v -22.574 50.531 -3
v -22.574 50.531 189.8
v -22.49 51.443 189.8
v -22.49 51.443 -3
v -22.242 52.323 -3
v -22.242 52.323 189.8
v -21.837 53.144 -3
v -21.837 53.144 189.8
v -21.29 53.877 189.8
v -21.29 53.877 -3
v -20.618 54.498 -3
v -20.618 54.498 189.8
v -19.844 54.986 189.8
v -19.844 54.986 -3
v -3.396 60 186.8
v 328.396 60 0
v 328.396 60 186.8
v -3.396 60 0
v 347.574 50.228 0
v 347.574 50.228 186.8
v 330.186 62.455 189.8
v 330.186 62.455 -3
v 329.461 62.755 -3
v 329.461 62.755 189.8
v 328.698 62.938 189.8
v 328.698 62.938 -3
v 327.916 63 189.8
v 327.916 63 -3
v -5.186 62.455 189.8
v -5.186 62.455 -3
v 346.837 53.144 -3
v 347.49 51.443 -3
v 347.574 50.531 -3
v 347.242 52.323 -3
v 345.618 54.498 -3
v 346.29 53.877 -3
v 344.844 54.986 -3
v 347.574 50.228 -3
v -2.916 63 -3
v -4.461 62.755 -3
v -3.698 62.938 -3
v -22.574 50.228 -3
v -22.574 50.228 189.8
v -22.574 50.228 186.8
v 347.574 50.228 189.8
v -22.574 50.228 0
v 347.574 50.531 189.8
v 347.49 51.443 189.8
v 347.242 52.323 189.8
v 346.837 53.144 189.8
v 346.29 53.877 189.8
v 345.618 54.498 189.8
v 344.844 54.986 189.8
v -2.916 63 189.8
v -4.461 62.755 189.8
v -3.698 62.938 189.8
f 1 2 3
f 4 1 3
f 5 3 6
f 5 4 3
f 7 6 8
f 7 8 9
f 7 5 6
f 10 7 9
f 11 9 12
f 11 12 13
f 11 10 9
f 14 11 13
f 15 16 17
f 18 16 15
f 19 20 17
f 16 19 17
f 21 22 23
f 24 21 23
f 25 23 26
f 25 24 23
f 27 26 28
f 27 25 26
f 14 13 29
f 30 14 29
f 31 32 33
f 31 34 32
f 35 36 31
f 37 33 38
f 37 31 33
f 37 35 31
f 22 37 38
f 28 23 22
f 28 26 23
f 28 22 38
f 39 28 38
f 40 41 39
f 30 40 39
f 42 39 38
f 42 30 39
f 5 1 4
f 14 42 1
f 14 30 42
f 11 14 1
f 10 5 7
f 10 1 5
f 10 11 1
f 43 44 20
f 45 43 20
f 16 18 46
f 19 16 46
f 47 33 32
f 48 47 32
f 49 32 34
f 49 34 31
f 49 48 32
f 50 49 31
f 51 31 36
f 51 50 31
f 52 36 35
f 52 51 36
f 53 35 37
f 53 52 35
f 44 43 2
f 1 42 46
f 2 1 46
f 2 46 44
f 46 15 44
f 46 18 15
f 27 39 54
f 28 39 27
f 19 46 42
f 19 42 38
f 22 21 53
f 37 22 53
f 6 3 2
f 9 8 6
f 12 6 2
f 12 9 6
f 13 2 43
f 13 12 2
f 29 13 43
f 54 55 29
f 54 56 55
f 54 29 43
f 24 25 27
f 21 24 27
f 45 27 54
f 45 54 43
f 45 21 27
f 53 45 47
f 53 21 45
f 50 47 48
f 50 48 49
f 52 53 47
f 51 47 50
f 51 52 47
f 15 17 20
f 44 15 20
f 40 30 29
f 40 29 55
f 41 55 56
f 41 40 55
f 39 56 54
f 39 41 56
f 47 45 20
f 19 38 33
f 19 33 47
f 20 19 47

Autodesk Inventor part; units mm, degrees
ref_plane "YZ Plane" through (0, 0, 0) normal (1, 0, 0) x (0, 1, 0)
ref_plane "XZ Plane" through (0, 0, 0) normal (0, 1, 0) x (-1, 0, 0)
ref_plane "XY Plane" through (0, 0, 0) normal (0, 0, 1) x (1, 0, 0)
sketch "Sketch1" plane through (0, 0, 0) normal (0, 0, 1) x (1, 0, 0)
  line L0 (328.3961, 60) -> (-3.3961, 60)
  line L1 (-3.3961, 60) -> (-22.5738, 50.2284)
  line L2 (347.5738, 50.2284) -> (328.3961, 60)
  line L3 (-22.5738, 53.5954) -> (-4.1163, 63)
  line L4 (-4.1163, 63) -> (329.1163, 63)
  line L5 (329.1163, 63) -> (347.5738, 53.5954)
  line L6 (-22.5738, 50.2284) -> (-22.5738, 53.5954)
  line L7 (347.5738, 50.2284) -> (347.5738, 53.5954)
  point P0 (0, 0)
  dimension "d0" = 3
extrude "Extrusion1" add sketch "Sketch1" along normal blind 186.8
sketch "Sketch2" plane through (0, 0, 186.8) normal (0, 0, 1) x (1, 0, 0)
  line L0 (-22.5738, 53.5954) -> (-22.5738, 50.2284) projected
  line L1 (328.3961, 60) -> (347.5738, 50.2284) projected
  line L2 (-22.5738, 50.2284) -> (347.5738, 50.2284)
  line L3 (329.1163, 63) -> (-4.1163, 63) projected
  line L4 (-4.1163, 63) -> (-22.5738, 53.5954) projected
  line L5 (347.5738, 53.5954) -> (329.1163, 63) projected
  line L6 (347.5738, 50.2284) -> (347.5738, 53.5954) projected
  point P0 (0, 0)
extrude "Extrusion2" add sketch "Sketch2" along normal blind 3
sketch "Sketch3" plane through (0, 0, 0) normal (0, 0, -1) x (-1, 0, 0)
  line L0 (-328.3961, 60) -> (-347.5738, 50.2284) projected
  line L1 (22.5738, 50.2284) -> (-347.5738, 50.2284) projected
  line L2 (22.5738, 50.2284) -> (3.3961, 60) projected
  line L3 (3.3961, 60) -> (-328.3961, 60) projected
  line L4 (-347.5738, 53.5954) -> (-329.1163, 63) projected
  line L5 (-347.5738, 50.2284) -> (-347.5738, 53.5954) projected
  line L6 (-347.5738, 53.5954) -> (-329.1163, 63) projected
  line L7 (-347.5738, 50.2284) -> (-347.5738, 53.5954) projected
  line L8 (-328.3961, 60) -> (-347.5738, 50.2284) projected
  line L9 (3.3961, 60) -> (-328.3961, 60) projected
  line L10 (22.5738, 50.2284) -> (3.3961, 60) projected
  line L11 (22.5738, 53.5954) -> (22.5738, 50.2284) projected
  line L12 (4.1163, 63) -> (22.5738, 53.5954) projected
  line L13 (-329.1163, 63) -> (4.1163, 63) projected
  point P0 (0, 0)
extrude "Extrusion3" add sketch "Sketch3" along normal blind 3
fillet "Fillet1" radius 5 4 edges at (329.1163, 63, 93.4) (347.5738, 53.5954, 93.4) (-4.1163, 63, 93.4) (-22.5738, 53.5954, 93.4)
properties part number "pokrywa_czołg"
